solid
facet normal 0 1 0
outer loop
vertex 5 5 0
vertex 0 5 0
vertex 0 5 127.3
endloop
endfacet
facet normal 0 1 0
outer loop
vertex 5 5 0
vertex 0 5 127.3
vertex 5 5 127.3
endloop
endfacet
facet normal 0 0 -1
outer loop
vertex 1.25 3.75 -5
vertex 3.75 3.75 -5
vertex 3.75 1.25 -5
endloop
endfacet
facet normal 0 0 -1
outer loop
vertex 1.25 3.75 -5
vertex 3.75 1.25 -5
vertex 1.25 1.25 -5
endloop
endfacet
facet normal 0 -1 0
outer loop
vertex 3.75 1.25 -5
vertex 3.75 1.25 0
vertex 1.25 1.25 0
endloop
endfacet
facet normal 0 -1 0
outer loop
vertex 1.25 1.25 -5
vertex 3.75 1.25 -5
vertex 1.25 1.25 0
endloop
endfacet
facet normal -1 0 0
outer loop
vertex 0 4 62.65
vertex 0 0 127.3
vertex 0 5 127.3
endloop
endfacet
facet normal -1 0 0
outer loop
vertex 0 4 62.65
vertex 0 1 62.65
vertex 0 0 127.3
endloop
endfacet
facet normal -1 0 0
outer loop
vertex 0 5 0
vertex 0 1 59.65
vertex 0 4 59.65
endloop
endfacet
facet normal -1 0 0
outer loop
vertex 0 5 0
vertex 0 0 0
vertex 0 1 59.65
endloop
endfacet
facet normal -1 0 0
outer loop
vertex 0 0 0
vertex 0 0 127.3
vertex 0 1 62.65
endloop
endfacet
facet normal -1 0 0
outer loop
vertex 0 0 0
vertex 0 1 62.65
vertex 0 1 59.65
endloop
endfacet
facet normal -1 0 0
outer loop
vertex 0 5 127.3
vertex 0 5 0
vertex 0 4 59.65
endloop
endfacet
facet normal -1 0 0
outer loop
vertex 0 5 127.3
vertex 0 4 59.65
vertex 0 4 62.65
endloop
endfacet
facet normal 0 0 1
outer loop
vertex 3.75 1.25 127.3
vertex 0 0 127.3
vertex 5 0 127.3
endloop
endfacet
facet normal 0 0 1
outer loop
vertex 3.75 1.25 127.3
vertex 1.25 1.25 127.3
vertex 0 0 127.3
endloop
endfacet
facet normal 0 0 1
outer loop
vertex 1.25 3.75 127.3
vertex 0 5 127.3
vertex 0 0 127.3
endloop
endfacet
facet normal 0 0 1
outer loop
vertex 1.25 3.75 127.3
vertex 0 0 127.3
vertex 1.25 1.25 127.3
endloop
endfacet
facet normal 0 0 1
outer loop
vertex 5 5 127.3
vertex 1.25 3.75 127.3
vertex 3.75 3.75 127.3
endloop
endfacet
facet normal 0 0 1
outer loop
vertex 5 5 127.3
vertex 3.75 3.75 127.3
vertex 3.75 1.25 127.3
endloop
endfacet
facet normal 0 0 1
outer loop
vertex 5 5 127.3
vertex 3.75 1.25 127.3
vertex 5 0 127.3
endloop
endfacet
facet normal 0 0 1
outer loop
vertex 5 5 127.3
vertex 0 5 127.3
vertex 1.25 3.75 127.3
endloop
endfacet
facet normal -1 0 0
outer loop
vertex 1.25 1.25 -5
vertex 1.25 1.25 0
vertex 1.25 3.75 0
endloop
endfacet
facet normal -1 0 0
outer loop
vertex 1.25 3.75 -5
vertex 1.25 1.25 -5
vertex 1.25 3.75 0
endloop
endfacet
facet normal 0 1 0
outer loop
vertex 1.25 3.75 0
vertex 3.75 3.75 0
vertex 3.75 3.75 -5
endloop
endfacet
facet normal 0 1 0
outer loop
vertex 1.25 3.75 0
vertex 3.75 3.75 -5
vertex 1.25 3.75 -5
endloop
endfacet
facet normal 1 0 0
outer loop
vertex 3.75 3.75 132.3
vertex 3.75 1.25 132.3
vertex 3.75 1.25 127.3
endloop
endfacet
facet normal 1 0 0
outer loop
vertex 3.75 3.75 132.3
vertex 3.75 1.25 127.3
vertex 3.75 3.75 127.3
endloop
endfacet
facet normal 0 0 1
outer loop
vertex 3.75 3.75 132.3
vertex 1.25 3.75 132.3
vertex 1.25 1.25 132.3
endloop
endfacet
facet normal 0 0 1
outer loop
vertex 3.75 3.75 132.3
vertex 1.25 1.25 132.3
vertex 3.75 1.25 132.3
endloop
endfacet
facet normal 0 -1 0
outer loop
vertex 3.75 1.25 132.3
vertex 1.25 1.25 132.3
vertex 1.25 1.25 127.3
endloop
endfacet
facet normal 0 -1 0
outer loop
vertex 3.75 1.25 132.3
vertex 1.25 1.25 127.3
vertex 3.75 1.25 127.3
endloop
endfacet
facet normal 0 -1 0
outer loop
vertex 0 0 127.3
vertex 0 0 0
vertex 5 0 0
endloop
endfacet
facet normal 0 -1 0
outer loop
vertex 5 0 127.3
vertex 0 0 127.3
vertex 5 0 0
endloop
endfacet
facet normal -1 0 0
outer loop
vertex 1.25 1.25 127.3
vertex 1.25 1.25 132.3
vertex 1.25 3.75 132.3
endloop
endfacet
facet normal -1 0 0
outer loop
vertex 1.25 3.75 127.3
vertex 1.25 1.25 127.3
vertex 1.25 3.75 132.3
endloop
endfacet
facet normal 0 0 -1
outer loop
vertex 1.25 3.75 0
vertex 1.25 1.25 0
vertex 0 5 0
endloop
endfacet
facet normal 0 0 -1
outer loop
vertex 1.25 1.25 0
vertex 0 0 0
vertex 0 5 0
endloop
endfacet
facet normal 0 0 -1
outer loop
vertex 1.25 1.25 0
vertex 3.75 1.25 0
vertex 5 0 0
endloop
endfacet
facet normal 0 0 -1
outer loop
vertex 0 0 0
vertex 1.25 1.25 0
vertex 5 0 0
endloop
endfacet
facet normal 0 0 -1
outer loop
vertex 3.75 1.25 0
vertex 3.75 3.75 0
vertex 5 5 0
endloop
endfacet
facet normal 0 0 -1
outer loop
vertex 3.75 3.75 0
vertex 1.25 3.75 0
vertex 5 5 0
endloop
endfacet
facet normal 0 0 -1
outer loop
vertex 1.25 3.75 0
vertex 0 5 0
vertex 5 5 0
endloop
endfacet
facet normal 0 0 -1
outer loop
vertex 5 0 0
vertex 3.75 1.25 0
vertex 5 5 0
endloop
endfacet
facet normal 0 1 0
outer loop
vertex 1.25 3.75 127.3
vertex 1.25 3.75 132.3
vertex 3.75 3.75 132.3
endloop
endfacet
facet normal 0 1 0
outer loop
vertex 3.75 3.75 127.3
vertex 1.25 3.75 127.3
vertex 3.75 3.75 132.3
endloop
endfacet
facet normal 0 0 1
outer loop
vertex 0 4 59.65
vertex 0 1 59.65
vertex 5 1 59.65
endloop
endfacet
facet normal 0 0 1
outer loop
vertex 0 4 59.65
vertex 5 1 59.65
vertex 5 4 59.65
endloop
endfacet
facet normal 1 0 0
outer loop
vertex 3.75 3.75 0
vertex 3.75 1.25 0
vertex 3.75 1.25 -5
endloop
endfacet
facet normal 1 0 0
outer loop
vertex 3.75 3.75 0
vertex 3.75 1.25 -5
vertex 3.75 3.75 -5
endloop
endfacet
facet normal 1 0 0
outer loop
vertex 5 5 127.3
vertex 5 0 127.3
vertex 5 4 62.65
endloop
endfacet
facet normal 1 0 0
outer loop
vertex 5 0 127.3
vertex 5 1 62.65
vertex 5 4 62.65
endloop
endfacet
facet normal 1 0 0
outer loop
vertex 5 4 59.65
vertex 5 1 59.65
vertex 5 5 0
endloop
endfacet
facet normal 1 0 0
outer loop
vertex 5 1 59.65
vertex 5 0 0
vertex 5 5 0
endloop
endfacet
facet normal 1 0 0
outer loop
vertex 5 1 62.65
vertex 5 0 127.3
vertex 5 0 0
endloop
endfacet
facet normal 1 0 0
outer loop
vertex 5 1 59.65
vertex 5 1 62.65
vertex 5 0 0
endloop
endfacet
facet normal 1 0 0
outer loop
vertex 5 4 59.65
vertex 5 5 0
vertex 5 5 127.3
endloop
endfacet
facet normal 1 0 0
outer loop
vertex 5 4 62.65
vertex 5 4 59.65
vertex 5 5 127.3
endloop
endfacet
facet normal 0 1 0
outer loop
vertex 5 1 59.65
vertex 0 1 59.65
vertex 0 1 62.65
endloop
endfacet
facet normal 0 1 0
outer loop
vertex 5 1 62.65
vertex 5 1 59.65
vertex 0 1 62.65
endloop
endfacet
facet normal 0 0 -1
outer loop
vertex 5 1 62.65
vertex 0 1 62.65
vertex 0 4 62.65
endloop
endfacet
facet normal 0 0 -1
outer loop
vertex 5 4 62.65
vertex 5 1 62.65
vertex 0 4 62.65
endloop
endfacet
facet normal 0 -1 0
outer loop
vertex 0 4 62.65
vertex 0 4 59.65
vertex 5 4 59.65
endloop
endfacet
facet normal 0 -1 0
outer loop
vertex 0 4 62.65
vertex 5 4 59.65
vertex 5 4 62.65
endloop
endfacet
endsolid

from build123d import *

# Parameters (mm, degrees)
SKETCH1_W           = 5
SKETCH1_H           = 5
BOSS_EXTRUDE1_DEPTH = 127.3
SKETCH2_W           = 2.5
SKETCH2_H           = 2.5
BOSS_EXTRUDE2_DEPTH = 5
SKETCH3_W           = 2.5
SKETCH3_H           = 2.5
BOSS_EXTRUDE3_DEPTH = 5
SKETCH4_W           = 3
SKETCH4_H           = 3
CUT_EXTRUDE1_DEPTH  = 30


with BuildPart() as part:
    # Sketch1 → Boss-Extrude1 (new body)
    with BuildSketch(Plane.XY):
        with Locations((2.5, 2.5)):
            Rectangle(SKETCH1_W, SKETCH1_H)
    extrude(amount=BOSS_EXTRUDE1_DEPTH)

    # Sketch2 → Boss-Extrude2 (add)
    with BuildSketch(Plane(origin=(0, 0, 0), x_dir=(-1, 0, 0), z_dir=(0, 0, -1))):
        with Locations((-2.5, 2.5)):
            Rectangle(SKETCH2_W, SKETCH2_H)
    extrude(amount=BOSS_EXTRUDE2_DEPTH)

    # Sketch3 → Boss-Extrude3 (add)
    with BuildSketch(Plane.XY.offset(127.3)):
        with Locations((2.5, 2.5)):
            Rectangle(SKETCH3_W, SKETCH3_H)
    extrude(amount=BOSS_EXTRUDE3_DEPTH)

    # Sketch4 → Cut-Extrude1 (cut)
    with BuildSketch(Plane.ZY):
        with Locations((61.15, 2.5)):
            Rectangle(SKETCH4_W, SKETCH4_H)
    extrude(amount=-CUT_EXTRUDE1_DEPTH, mode=Mode.SUBTRACT)


solid = part.part
